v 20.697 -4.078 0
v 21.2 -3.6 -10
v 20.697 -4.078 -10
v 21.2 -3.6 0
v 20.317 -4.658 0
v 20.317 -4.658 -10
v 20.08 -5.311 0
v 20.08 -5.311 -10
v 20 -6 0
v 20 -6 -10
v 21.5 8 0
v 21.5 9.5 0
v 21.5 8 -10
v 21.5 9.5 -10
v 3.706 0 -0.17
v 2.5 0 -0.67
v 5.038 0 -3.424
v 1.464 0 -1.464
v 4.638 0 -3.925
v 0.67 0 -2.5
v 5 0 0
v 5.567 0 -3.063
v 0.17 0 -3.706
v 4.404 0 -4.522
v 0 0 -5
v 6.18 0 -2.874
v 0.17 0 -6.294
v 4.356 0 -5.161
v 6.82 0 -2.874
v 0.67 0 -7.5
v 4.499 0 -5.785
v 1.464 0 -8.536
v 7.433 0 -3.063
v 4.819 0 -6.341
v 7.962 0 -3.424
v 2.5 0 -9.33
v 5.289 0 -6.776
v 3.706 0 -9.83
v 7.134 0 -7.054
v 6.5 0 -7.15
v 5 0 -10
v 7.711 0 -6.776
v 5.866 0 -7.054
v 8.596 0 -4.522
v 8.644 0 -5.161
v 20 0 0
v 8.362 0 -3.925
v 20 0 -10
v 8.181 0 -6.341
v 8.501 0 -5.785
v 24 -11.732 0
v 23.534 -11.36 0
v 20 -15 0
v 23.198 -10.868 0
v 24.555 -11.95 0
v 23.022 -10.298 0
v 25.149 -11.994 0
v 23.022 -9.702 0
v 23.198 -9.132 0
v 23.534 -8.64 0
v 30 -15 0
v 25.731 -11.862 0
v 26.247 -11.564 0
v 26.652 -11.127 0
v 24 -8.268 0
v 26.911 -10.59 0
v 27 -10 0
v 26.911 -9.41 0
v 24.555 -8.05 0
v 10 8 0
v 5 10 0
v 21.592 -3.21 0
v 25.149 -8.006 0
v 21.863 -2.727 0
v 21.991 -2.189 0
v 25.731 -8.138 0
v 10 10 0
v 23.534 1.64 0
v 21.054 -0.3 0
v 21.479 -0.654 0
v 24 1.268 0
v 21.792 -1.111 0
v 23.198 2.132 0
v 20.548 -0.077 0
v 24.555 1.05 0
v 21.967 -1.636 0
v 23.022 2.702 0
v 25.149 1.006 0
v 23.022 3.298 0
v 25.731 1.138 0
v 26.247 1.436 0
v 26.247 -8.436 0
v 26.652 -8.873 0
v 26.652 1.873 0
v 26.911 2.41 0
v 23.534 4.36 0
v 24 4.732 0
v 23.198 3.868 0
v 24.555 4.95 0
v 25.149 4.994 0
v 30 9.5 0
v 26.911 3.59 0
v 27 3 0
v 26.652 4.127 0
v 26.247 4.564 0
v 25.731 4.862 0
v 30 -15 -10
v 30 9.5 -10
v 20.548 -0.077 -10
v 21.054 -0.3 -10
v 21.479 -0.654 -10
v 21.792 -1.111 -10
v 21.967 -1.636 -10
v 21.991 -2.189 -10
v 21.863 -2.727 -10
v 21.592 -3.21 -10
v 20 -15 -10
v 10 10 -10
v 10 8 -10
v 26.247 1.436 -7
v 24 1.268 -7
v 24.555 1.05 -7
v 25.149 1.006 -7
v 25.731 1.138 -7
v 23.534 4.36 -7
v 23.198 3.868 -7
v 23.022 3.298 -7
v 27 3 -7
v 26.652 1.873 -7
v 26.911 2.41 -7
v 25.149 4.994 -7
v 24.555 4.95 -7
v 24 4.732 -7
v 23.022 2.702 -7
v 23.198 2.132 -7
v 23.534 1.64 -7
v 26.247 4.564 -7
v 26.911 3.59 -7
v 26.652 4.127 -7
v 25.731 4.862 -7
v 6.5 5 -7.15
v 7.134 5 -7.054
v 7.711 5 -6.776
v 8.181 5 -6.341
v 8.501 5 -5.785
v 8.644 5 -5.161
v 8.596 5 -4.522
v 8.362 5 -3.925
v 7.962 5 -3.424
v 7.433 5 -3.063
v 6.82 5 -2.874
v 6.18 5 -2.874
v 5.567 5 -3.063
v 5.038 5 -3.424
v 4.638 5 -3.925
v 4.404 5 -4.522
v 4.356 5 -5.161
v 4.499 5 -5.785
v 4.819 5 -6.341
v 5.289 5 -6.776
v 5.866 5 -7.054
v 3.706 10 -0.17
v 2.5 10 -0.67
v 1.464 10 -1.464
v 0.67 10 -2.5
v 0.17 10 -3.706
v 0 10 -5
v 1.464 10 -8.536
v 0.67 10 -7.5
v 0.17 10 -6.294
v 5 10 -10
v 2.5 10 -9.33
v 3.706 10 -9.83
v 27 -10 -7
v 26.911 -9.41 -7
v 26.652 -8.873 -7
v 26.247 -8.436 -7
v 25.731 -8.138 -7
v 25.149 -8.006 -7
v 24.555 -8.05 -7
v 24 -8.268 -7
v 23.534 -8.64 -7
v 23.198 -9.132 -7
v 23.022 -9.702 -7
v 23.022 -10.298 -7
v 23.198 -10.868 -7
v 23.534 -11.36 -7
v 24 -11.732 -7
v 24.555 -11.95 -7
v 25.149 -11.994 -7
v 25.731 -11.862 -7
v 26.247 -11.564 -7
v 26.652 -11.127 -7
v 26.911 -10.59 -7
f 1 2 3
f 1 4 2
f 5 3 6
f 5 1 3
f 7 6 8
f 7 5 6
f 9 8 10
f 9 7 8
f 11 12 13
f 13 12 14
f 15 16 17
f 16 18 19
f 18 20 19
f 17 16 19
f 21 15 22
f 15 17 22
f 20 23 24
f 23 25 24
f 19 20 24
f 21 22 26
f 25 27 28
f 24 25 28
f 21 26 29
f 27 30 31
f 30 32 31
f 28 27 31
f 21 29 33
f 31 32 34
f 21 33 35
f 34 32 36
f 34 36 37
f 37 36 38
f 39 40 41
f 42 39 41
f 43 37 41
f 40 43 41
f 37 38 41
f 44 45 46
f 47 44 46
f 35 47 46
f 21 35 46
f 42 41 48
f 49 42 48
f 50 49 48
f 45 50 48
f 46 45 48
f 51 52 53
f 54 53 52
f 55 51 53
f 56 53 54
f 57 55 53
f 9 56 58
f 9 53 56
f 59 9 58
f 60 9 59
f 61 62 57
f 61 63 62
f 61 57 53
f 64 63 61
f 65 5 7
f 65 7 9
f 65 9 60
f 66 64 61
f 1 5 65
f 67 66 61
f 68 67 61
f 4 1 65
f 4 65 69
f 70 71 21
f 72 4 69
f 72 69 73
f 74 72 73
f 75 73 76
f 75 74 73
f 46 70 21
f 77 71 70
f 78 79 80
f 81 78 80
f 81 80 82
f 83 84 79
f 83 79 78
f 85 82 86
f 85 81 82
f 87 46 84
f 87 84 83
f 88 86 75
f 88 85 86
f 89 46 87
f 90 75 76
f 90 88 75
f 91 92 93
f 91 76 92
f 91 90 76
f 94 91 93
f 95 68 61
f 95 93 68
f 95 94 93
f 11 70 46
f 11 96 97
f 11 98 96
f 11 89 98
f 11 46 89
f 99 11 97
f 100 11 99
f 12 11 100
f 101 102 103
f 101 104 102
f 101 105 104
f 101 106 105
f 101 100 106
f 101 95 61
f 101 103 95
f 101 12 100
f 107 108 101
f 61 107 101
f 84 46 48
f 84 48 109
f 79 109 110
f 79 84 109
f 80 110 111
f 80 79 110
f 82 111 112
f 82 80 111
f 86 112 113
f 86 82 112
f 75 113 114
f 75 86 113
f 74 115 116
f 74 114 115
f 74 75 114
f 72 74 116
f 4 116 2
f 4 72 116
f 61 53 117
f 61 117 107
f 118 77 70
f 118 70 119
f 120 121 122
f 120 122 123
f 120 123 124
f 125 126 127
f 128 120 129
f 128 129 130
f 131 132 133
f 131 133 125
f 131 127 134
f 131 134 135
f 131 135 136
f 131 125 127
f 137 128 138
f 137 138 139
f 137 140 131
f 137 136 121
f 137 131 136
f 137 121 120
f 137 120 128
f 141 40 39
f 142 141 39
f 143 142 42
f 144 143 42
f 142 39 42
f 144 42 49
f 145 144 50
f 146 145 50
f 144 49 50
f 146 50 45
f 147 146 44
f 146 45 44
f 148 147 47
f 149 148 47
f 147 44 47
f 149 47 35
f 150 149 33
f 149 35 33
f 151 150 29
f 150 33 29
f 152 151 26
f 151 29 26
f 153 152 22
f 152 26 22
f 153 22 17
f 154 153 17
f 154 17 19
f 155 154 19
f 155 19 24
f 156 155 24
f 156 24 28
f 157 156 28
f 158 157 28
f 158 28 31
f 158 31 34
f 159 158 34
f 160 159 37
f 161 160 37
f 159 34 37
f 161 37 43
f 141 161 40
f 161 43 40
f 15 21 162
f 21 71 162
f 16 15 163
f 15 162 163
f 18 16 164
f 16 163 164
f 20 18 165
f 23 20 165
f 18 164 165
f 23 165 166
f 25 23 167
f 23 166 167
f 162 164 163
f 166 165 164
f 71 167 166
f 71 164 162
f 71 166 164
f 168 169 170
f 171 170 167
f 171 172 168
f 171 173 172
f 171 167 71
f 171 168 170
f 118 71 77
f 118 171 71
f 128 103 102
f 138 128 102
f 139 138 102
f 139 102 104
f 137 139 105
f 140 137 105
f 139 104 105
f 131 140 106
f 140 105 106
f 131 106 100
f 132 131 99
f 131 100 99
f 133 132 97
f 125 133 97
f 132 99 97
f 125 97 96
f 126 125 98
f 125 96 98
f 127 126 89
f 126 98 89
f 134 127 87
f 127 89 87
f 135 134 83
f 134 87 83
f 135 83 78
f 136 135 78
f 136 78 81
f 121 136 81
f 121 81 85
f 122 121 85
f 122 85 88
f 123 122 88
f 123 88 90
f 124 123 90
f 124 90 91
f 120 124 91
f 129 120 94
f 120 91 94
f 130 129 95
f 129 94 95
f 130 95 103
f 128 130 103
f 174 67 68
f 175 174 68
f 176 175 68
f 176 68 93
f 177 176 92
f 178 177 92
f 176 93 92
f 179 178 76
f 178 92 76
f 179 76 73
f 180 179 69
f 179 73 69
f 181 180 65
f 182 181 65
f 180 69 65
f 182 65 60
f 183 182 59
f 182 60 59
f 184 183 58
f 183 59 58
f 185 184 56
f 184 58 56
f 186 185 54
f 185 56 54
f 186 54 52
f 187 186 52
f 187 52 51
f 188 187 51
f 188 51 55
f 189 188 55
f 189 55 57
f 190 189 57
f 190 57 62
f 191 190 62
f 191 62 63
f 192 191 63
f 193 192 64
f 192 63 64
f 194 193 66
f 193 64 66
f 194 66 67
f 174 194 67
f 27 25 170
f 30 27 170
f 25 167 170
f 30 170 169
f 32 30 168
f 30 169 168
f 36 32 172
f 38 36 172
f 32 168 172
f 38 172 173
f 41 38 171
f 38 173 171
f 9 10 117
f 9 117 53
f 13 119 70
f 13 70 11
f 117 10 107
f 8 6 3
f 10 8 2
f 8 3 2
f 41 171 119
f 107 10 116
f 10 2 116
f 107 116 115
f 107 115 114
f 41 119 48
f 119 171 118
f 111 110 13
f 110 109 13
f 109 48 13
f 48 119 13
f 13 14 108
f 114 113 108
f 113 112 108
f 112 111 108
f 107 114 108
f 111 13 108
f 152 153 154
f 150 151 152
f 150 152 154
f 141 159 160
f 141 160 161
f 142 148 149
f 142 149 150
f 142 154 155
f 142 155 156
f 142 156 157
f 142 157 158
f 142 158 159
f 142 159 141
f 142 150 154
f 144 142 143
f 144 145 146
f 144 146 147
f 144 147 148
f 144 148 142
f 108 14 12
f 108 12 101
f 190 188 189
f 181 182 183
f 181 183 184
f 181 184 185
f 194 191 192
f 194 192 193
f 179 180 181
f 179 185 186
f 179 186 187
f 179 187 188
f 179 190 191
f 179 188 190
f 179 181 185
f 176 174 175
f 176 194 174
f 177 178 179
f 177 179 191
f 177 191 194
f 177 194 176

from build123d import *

# Parameters (mm, degrees)
BOSS_EXTRUDE1_DEPTH     = 10
SKETCH2_W               = 11.5
SKETCH2_H               = 17.246462599
CUT_EXTRUDE1_DEPTH      = 2
FILLET1_R               = 5
SKETCH4_R               = 2.15
CUT_EXTRUDE4_DEPTH      = 5
SKETCH6_W               = 10
SKETCH6_H               = 10
BOSS_EXTRUDE2_DEPTH     = 15
SKETCH5_R               = 2
CUT_EXTRUDE5_DEPTH      = 7
SKETCH7_W               = 8.5
SKETCH7_H               = 10
CUT_EXTRUDE6_DEPTH      = 0.5
CUT_EXTRUDE7_DEPTH      = 36
CUT_EXTRUDE7_DEPTH_BACK = 36
SKETCH8_R               = 2
FILLET2_R               = 3


with BuildPart() as part:
    # Sketch1 → Boss-Extrude1 (new body)
    with BuildSketch(Plane(origin=(0, 0, 0), x_dir=(1, 0, 0), z_dir=(0, 1, 0))):
        Polygon((0, 0), (20, 0), (30, 0), (30, 10), (0, 10), align=None)
    extrude(amount=BOSS_EXTRUDE1_DEPTH)

    # Sketch2 → Cut-Extrude1 (cut)
    with BuildSketch(Plane(origin=(0, 10, 0), x_dir=(1, 0, 0), z_dir=(0, 1, 0))):
        with Locations((15.75, 1.3767687)):
            Rectangle(SKETCH2_W, SKETCH2_H)
    extrude(amount=-CUT_EXTRUDE1_DEPTH, mode=Mode.SUBTRACT)

    # Fillet1
    fillet1_edges = [part.edges().sort_by_distance(p)[0] for p in [
        (0, 5, -10),
        (0, 5, 0),
    ]]
    fillet(fillet1_edges, radius=FILLET1_R - 0.0001)  # a hair under: the kernel refuses the full size

    # Sketch4 → Cut-Extrude4 (cut)
    with BuildSketch(Plane.XZ):
        with Locations(Location((6.5, -5, 0), (0, 0, 270))):
            Circle(SKETCH4_R)
    extrude(amount=-CUT_EXTRUDE4_DEPTH, mode=Mode.SUBTRACT)

    # Sketch6 → Boss-Extrude2 (add)
    with BuildSketch(Plane.XZ):
        with Locations((25, -5)):
            Rectangle(SKETCH6_W, SKETCH6_H)
    extrude(amount=BOSS_EXTRUDE2_DEPTH)

    # Sketch5 → Cut-Extrude5 (cut)
    with BuildSketch(Plane.XY):
        with Locations((25, 3)):
            Circle(SKETCH5_R)
        with Locations((25, -10)):
            Circle(SKETCH5_R)
    extrude(amount=-CUT_EXTRUDE5_DEPTH, mode=Mode.SUBTRACT)

    # Sketch7 → Cut-Extrude6 (cut)
    with BuildSketch(Plane(origin=(0, 10, 0), x_dir=(1, 0, 0), z_dir=(0, 1, 0))):
        with Locations((25.75, 5)):
            Rectangle(SKETCH7_W, SKETCH7_H)
    extrude(amount=-CUT_EXTRUDE6_DEPTH, mode=Mode.SUBTRACT)

    # Sketch8 → Cut-Extrude7 (cut, two sides: drawn at the far end of the back side and taken through both)
    with BuildSketch(Plane(origin=(0, 0, -10), x_dir=(-1, 0, 0), z_dir=(0, 0, -1)).offset(-CUT_EXTRUDE7_DEPTH_BACK)):
        with Locations((-20, -2)):
            Circle(SKETCH8_R)
    extrude(amount=CUT_EXTRUDE7_DEPTH + CUT_EXTRUDE7_DEPTH_BACK, mode=Mode.SUBTRACT)

    # Fillet2
    fillet2_edges = [part.edges().sort_by_distance(p)[0] for p in [
        (20, -4, -5),
    ]]
    fillet(fillet2_edges, radius=FILLET2_R)


solid = part.part
